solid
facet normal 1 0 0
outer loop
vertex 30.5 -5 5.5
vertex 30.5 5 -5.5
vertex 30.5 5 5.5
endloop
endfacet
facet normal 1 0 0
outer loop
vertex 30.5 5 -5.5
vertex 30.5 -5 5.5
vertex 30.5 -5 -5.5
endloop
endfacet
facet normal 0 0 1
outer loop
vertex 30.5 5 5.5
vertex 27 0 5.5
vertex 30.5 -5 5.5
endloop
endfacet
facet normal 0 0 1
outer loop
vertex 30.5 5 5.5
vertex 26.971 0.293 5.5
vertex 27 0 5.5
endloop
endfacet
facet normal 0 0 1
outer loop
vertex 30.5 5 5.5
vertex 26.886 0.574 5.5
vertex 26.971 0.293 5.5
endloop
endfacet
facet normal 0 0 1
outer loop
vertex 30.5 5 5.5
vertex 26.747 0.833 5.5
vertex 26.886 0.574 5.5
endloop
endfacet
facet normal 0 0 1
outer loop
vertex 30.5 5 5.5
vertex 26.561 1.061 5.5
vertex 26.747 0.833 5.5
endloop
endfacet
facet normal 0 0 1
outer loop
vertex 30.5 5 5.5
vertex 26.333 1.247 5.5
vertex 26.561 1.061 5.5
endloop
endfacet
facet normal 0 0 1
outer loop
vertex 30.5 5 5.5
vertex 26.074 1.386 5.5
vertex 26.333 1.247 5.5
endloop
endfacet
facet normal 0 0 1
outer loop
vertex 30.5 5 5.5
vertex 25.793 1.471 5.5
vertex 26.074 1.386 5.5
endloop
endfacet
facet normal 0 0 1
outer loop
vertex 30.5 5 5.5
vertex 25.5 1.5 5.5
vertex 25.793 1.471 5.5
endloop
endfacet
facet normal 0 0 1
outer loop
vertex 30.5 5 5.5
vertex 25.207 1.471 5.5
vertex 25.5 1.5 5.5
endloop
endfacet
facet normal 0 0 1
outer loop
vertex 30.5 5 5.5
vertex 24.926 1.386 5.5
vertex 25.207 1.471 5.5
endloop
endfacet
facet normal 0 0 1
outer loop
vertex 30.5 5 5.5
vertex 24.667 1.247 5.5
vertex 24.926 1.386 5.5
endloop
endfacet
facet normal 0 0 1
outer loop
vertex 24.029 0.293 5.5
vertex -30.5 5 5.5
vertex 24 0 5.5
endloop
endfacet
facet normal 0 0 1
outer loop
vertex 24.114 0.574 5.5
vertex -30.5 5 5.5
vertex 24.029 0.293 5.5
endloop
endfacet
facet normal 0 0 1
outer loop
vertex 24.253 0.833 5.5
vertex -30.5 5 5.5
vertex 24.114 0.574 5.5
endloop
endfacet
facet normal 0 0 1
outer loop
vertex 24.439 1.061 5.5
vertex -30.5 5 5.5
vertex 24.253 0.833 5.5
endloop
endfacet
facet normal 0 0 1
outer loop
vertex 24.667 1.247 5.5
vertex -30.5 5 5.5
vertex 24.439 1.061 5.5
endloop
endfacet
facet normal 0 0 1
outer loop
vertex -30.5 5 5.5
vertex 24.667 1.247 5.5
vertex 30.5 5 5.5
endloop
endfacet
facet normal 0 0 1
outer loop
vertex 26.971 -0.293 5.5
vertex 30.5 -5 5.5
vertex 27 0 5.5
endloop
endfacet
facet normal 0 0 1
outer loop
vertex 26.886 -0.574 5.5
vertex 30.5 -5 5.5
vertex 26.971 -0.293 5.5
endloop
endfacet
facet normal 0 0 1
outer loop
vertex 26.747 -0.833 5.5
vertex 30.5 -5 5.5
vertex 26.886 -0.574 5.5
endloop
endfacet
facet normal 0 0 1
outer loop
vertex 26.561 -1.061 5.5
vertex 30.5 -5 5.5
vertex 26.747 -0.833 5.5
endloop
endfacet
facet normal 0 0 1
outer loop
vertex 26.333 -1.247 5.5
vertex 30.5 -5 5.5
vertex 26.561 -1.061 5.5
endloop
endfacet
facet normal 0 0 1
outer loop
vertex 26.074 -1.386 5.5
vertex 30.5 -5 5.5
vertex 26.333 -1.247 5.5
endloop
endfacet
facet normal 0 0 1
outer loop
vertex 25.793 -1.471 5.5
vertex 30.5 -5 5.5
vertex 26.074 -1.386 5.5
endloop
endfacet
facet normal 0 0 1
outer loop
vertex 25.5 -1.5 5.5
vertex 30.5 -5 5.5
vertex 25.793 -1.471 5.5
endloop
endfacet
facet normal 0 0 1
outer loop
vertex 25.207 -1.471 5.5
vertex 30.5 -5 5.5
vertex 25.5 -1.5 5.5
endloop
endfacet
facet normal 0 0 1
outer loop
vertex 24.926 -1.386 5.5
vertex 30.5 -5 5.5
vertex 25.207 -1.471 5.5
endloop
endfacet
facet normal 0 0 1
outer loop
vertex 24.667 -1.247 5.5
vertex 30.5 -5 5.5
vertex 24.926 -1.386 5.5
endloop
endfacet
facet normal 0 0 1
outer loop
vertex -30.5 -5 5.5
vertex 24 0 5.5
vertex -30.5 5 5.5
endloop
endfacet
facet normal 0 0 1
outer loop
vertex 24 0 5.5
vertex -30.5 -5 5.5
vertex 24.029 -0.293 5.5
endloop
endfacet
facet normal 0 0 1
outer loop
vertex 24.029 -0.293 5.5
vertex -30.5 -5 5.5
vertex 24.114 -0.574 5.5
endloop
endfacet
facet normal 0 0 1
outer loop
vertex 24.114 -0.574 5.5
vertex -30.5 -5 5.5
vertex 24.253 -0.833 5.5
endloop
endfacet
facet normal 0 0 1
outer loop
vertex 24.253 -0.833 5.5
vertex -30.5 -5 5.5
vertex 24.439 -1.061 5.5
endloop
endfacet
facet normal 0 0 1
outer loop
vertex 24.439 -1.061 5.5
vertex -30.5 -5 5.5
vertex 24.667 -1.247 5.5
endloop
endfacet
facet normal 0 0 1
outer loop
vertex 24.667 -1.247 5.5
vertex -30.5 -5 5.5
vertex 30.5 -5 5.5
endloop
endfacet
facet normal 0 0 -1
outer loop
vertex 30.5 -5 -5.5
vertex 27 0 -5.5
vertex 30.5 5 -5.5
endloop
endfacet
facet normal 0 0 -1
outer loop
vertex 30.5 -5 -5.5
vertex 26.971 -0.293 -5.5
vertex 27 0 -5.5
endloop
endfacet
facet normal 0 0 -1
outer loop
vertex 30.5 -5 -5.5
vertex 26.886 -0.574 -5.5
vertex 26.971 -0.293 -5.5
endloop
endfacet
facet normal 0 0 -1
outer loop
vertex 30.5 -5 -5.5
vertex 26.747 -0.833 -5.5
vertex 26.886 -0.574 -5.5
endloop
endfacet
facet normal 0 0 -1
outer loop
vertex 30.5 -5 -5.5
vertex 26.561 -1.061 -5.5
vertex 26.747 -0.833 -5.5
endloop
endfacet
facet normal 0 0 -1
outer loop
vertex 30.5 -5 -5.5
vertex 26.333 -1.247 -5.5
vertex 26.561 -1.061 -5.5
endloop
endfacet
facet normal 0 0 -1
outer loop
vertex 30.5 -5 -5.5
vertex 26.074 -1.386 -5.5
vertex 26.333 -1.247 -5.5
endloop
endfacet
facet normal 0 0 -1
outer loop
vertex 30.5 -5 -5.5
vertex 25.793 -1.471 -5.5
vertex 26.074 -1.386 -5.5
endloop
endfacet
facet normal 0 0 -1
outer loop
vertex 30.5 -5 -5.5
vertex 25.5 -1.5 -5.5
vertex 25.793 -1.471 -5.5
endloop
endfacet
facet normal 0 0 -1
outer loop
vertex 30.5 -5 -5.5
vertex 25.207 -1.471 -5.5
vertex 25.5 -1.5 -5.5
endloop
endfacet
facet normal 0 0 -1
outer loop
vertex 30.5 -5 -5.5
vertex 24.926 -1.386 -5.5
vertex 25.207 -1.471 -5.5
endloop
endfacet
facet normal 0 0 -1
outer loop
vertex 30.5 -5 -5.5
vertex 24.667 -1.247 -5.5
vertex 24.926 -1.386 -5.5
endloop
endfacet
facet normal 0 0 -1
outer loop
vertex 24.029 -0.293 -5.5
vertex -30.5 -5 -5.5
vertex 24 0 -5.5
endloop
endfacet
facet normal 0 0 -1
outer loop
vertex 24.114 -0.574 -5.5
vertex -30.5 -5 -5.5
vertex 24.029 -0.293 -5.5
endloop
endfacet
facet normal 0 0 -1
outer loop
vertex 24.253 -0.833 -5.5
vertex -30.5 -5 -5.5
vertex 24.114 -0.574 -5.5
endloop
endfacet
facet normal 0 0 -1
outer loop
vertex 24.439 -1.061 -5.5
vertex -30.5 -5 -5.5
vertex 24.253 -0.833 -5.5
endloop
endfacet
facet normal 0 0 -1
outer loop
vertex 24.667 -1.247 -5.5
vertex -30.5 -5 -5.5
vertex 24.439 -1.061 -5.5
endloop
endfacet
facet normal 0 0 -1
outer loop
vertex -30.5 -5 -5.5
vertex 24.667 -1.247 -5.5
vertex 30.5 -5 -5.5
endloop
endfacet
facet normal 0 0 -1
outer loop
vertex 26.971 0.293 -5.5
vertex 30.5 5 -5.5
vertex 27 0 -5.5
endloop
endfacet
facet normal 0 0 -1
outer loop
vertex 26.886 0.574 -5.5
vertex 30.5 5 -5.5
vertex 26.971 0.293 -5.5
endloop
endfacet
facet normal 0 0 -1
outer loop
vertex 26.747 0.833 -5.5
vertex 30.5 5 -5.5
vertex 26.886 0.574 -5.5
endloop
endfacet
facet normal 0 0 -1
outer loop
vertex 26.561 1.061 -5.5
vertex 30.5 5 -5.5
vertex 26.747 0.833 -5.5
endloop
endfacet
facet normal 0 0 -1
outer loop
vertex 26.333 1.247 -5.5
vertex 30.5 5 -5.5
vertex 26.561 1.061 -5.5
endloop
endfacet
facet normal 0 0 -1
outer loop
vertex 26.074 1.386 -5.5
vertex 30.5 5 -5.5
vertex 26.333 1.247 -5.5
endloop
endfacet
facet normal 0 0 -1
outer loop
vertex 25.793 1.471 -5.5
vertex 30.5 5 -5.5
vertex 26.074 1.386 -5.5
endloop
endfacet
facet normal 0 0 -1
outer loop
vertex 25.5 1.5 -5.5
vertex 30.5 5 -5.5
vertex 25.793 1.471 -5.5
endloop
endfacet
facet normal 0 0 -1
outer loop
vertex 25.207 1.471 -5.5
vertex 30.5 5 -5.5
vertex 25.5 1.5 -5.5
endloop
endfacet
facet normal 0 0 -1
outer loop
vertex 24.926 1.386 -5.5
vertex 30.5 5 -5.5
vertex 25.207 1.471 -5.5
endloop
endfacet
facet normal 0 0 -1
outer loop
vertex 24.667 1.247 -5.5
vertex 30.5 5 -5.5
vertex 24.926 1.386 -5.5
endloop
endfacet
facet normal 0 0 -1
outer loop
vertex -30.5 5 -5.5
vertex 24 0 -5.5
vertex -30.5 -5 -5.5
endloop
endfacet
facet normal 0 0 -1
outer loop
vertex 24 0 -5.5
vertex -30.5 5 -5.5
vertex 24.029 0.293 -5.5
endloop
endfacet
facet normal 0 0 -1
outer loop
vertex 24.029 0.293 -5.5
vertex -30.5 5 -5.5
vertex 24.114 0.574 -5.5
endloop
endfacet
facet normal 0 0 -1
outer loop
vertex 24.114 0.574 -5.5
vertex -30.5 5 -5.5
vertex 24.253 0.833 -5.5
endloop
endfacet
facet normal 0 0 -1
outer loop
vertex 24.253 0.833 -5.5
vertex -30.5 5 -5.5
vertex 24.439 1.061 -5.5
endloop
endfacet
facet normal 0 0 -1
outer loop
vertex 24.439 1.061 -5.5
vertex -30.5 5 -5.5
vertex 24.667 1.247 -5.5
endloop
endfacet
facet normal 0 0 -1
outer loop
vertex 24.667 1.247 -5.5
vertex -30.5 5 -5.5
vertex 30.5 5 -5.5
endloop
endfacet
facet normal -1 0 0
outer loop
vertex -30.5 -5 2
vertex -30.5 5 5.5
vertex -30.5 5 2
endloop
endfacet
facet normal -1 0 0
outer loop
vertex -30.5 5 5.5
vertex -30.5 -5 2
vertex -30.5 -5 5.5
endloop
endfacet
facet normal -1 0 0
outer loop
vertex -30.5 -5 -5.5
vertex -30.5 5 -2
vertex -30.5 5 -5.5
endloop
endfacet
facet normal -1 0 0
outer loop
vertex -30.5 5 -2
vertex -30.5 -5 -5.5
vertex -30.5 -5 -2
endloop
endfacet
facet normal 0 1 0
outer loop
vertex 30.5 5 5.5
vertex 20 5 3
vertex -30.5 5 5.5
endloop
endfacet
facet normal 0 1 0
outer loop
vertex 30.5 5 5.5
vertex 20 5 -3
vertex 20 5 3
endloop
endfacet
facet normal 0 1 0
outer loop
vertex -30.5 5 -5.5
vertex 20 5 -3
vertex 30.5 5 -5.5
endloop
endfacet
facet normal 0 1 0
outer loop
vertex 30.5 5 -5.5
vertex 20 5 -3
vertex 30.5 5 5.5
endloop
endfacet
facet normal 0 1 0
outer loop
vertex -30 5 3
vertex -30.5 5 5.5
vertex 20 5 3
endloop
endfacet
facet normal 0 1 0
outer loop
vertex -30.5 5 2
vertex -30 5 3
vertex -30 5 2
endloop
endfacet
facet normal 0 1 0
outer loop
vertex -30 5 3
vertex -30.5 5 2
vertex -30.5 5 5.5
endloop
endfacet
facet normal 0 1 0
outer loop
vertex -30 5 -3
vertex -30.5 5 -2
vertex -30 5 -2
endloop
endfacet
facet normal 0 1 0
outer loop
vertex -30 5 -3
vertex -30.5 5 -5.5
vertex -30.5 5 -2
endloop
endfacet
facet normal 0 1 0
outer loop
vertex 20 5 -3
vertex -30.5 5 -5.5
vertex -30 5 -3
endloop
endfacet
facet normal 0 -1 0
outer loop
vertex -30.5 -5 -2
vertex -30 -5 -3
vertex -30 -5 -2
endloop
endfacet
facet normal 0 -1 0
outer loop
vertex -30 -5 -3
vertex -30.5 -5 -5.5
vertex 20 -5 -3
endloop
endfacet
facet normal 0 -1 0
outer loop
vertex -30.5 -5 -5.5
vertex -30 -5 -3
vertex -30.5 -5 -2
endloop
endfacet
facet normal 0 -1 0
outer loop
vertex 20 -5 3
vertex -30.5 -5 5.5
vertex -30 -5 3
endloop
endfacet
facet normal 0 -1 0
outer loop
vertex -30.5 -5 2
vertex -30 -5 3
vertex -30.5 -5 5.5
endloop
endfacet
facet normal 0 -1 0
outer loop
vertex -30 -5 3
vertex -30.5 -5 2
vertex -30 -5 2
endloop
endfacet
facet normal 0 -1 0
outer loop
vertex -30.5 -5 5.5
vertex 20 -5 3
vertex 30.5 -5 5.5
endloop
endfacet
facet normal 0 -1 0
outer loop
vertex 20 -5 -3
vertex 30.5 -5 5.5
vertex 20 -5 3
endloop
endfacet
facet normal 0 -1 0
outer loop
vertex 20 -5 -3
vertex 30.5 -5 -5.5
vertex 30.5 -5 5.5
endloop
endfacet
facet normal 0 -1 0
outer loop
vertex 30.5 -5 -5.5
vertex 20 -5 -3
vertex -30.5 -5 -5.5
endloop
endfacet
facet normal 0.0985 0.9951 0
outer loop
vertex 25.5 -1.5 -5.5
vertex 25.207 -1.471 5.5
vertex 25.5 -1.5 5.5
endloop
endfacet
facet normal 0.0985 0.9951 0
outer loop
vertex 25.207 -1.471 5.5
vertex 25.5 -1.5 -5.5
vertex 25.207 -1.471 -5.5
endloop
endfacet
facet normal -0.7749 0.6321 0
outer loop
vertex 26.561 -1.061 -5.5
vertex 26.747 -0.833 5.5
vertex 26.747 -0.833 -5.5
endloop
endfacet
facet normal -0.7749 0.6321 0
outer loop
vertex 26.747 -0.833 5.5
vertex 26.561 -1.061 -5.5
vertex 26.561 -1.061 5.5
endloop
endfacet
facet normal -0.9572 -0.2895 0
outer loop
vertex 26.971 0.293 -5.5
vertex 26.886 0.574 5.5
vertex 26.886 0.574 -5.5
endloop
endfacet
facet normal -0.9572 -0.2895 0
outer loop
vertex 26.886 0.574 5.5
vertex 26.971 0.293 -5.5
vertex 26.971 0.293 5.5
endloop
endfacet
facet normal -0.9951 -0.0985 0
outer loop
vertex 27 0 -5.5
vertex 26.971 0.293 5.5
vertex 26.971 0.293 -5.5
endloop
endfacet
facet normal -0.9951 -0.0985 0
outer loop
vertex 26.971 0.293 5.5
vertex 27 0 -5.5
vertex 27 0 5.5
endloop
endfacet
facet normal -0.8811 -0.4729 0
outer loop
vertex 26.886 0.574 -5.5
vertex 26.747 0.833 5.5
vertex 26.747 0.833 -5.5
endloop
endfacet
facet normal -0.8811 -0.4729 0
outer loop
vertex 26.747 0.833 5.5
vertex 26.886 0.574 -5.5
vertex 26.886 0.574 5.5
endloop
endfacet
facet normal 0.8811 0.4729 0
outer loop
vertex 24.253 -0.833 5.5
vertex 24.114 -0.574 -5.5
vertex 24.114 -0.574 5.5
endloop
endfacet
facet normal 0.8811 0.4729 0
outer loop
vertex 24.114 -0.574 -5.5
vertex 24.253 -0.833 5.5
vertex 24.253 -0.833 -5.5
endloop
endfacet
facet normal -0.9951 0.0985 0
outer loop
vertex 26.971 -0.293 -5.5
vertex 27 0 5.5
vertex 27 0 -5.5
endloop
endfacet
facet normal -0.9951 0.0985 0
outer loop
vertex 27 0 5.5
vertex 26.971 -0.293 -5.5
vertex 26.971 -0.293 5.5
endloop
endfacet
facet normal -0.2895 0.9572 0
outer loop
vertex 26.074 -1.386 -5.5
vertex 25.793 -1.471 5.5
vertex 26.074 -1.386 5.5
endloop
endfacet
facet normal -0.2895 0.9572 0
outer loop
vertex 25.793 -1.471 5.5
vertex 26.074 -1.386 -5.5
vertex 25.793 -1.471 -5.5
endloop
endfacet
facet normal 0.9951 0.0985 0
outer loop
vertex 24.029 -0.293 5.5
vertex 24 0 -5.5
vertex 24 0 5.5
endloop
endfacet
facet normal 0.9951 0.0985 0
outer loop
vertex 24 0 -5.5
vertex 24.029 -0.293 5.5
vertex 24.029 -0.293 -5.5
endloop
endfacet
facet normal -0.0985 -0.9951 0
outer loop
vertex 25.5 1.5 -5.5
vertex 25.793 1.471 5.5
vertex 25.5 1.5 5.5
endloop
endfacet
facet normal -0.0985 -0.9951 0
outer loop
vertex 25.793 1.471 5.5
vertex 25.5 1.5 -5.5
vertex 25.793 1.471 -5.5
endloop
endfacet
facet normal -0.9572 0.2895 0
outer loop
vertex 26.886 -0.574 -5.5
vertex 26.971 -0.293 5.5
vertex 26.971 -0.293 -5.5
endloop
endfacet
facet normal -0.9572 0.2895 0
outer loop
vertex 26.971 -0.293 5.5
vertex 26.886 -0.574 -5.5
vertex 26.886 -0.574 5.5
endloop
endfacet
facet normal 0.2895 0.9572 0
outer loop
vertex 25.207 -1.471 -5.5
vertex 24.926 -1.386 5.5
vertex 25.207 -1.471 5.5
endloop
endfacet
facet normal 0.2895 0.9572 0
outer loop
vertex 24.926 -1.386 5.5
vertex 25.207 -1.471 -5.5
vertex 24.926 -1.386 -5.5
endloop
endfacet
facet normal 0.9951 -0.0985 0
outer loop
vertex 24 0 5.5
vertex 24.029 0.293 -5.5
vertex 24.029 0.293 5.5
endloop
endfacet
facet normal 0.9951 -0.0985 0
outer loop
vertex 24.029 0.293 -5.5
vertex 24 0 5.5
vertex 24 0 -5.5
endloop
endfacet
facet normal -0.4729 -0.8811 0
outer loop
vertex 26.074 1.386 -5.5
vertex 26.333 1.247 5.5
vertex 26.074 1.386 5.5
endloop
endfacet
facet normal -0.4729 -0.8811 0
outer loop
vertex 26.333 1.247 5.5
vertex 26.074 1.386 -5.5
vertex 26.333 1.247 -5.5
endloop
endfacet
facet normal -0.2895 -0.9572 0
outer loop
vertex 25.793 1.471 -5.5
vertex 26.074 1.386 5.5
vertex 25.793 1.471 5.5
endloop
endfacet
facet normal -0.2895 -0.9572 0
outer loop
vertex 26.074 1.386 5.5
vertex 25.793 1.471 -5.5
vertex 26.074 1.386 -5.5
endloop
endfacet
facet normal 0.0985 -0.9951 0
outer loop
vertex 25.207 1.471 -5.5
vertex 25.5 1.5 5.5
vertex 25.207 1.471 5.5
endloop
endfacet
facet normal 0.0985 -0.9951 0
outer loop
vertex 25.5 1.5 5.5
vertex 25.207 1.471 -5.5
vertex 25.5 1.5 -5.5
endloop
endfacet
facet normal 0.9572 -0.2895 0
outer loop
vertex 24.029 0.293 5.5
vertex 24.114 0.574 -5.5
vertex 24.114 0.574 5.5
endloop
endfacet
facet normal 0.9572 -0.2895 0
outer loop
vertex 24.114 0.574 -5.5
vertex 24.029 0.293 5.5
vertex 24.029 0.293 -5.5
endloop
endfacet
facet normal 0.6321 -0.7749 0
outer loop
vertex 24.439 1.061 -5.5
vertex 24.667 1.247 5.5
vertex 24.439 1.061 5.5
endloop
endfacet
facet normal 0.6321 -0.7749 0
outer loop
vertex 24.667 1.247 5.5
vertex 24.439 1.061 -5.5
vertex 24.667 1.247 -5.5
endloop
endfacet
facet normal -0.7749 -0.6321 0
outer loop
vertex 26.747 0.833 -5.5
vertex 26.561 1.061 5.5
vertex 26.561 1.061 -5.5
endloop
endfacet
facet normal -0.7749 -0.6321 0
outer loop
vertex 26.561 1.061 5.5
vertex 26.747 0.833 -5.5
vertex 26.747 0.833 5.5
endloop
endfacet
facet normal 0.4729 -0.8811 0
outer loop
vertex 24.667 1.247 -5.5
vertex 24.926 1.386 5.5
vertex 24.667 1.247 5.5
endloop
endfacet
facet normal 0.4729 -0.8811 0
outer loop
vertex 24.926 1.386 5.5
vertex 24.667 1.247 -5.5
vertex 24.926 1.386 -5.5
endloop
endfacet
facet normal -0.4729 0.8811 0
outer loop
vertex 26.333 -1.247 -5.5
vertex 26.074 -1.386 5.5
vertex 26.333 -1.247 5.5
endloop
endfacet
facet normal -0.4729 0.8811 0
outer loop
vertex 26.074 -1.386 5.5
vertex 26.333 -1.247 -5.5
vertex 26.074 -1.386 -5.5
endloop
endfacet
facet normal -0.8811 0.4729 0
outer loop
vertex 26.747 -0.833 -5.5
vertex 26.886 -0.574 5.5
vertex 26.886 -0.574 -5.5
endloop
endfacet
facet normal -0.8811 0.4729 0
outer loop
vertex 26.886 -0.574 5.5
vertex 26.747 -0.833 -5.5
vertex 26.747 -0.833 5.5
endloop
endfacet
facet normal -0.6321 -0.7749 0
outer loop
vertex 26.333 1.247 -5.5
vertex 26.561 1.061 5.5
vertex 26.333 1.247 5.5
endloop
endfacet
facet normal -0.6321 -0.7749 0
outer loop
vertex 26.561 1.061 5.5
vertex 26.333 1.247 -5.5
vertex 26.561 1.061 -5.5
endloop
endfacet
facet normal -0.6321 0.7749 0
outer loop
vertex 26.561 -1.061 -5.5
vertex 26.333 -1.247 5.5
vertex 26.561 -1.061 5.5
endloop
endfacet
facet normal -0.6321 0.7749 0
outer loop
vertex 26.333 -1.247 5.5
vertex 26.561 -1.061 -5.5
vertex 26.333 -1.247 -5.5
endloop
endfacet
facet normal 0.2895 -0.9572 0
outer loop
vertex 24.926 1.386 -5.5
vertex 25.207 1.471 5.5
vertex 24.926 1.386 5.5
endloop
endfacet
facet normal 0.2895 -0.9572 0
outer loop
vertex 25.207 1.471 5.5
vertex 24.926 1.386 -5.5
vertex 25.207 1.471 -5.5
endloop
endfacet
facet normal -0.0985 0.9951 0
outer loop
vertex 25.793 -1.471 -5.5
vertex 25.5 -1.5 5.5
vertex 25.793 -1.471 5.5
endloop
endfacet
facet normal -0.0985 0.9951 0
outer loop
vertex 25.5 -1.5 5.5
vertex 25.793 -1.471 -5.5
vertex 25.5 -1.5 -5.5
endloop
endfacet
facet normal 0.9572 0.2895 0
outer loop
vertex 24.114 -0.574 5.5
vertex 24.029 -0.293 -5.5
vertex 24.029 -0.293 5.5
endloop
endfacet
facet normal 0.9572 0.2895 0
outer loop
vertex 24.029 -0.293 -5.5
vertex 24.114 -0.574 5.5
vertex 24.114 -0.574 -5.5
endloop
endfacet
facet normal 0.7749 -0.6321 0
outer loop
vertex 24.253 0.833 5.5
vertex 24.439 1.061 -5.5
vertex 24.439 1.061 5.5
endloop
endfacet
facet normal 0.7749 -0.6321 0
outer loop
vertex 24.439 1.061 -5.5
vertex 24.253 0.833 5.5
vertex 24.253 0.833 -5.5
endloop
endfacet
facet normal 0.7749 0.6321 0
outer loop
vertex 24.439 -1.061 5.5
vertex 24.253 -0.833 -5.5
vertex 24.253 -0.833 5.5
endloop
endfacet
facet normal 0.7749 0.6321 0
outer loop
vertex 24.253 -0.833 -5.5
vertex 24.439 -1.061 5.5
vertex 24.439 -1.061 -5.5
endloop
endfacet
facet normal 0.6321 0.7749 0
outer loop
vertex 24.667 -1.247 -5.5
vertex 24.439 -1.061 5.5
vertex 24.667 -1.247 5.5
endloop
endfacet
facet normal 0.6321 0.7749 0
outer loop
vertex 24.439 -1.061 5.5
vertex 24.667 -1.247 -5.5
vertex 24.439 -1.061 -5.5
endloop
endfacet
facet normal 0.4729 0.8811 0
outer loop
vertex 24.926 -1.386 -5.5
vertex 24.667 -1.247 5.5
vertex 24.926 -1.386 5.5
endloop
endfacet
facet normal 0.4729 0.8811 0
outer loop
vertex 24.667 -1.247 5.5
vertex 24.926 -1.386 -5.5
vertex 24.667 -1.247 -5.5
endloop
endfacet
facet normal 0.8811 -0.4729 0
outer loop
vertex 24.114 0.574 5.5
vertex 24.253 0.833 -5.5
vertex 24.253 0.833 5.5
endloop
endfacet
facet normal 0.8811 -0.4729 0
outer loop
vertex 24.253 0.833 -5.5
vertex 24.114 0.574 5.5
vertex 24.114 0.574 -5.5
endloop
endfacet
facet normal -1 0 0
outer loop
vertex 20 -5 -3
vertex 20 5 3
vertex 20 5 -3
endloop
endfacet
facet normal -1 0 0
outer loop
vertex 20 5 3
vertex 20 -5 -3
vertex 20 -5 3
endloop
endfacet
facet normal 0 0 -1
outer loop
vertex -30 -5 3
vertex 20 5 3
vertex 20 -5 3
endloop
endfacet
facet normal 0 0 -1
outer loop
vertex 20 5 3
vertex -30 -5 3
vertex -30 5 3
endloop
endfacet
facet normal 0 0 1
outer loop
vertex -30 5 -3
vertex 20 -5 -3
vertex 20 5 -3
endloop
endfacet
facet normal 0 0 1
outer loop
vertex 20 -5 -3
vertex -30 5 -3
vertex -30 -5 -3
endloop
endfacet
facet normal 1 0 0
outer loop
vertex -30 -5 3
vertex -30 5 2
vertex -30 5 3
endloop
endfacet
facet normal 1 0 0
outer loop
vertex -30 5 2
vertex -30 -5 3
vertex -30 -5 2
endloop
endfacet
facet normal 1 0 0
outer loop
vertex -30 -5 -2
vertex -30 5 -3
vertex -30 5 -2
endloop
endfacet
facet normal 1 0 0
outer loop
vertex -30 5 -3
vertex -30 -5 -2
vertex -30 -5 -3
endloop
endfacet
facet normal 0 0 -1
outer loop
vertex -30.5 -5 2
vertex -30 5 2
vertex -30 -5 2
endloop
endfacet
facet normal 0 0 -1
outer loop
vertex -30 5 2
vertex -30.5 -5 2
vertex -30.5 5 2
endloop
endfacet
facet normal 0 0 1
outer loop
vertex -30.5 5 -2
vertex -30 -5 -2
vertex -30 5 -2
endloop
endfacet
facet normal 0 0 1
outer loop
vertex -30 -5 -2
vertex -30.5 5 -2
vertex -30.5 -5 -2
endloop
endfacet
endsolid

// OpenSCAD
// Filament guide for OneUp printer from QU-BD
//
// (c) 2014 Laird Popkin

barWidth = 50;
barThick = 6;
thick=2.5;
height = barThick+2*thick;
head = 10;
tubeD = 3;
tubeR = tubeD/2;
width = 10;
snap=1;
$fn=32;

len=barWidth+snap+head;

difference() {
	cube([len, width, height], center=true);
	translate([len/2-head/2,0,0]) cylinder(r=tubeR, h=height+2, center=true);
	translate([-head/2,0,0]) cube([barWidth,barWidth,barThick], center=true);
	translate([-head/2-snap,0,0]) cube([barWidth,barWidth,barThick-2*snap], center=true);
}
